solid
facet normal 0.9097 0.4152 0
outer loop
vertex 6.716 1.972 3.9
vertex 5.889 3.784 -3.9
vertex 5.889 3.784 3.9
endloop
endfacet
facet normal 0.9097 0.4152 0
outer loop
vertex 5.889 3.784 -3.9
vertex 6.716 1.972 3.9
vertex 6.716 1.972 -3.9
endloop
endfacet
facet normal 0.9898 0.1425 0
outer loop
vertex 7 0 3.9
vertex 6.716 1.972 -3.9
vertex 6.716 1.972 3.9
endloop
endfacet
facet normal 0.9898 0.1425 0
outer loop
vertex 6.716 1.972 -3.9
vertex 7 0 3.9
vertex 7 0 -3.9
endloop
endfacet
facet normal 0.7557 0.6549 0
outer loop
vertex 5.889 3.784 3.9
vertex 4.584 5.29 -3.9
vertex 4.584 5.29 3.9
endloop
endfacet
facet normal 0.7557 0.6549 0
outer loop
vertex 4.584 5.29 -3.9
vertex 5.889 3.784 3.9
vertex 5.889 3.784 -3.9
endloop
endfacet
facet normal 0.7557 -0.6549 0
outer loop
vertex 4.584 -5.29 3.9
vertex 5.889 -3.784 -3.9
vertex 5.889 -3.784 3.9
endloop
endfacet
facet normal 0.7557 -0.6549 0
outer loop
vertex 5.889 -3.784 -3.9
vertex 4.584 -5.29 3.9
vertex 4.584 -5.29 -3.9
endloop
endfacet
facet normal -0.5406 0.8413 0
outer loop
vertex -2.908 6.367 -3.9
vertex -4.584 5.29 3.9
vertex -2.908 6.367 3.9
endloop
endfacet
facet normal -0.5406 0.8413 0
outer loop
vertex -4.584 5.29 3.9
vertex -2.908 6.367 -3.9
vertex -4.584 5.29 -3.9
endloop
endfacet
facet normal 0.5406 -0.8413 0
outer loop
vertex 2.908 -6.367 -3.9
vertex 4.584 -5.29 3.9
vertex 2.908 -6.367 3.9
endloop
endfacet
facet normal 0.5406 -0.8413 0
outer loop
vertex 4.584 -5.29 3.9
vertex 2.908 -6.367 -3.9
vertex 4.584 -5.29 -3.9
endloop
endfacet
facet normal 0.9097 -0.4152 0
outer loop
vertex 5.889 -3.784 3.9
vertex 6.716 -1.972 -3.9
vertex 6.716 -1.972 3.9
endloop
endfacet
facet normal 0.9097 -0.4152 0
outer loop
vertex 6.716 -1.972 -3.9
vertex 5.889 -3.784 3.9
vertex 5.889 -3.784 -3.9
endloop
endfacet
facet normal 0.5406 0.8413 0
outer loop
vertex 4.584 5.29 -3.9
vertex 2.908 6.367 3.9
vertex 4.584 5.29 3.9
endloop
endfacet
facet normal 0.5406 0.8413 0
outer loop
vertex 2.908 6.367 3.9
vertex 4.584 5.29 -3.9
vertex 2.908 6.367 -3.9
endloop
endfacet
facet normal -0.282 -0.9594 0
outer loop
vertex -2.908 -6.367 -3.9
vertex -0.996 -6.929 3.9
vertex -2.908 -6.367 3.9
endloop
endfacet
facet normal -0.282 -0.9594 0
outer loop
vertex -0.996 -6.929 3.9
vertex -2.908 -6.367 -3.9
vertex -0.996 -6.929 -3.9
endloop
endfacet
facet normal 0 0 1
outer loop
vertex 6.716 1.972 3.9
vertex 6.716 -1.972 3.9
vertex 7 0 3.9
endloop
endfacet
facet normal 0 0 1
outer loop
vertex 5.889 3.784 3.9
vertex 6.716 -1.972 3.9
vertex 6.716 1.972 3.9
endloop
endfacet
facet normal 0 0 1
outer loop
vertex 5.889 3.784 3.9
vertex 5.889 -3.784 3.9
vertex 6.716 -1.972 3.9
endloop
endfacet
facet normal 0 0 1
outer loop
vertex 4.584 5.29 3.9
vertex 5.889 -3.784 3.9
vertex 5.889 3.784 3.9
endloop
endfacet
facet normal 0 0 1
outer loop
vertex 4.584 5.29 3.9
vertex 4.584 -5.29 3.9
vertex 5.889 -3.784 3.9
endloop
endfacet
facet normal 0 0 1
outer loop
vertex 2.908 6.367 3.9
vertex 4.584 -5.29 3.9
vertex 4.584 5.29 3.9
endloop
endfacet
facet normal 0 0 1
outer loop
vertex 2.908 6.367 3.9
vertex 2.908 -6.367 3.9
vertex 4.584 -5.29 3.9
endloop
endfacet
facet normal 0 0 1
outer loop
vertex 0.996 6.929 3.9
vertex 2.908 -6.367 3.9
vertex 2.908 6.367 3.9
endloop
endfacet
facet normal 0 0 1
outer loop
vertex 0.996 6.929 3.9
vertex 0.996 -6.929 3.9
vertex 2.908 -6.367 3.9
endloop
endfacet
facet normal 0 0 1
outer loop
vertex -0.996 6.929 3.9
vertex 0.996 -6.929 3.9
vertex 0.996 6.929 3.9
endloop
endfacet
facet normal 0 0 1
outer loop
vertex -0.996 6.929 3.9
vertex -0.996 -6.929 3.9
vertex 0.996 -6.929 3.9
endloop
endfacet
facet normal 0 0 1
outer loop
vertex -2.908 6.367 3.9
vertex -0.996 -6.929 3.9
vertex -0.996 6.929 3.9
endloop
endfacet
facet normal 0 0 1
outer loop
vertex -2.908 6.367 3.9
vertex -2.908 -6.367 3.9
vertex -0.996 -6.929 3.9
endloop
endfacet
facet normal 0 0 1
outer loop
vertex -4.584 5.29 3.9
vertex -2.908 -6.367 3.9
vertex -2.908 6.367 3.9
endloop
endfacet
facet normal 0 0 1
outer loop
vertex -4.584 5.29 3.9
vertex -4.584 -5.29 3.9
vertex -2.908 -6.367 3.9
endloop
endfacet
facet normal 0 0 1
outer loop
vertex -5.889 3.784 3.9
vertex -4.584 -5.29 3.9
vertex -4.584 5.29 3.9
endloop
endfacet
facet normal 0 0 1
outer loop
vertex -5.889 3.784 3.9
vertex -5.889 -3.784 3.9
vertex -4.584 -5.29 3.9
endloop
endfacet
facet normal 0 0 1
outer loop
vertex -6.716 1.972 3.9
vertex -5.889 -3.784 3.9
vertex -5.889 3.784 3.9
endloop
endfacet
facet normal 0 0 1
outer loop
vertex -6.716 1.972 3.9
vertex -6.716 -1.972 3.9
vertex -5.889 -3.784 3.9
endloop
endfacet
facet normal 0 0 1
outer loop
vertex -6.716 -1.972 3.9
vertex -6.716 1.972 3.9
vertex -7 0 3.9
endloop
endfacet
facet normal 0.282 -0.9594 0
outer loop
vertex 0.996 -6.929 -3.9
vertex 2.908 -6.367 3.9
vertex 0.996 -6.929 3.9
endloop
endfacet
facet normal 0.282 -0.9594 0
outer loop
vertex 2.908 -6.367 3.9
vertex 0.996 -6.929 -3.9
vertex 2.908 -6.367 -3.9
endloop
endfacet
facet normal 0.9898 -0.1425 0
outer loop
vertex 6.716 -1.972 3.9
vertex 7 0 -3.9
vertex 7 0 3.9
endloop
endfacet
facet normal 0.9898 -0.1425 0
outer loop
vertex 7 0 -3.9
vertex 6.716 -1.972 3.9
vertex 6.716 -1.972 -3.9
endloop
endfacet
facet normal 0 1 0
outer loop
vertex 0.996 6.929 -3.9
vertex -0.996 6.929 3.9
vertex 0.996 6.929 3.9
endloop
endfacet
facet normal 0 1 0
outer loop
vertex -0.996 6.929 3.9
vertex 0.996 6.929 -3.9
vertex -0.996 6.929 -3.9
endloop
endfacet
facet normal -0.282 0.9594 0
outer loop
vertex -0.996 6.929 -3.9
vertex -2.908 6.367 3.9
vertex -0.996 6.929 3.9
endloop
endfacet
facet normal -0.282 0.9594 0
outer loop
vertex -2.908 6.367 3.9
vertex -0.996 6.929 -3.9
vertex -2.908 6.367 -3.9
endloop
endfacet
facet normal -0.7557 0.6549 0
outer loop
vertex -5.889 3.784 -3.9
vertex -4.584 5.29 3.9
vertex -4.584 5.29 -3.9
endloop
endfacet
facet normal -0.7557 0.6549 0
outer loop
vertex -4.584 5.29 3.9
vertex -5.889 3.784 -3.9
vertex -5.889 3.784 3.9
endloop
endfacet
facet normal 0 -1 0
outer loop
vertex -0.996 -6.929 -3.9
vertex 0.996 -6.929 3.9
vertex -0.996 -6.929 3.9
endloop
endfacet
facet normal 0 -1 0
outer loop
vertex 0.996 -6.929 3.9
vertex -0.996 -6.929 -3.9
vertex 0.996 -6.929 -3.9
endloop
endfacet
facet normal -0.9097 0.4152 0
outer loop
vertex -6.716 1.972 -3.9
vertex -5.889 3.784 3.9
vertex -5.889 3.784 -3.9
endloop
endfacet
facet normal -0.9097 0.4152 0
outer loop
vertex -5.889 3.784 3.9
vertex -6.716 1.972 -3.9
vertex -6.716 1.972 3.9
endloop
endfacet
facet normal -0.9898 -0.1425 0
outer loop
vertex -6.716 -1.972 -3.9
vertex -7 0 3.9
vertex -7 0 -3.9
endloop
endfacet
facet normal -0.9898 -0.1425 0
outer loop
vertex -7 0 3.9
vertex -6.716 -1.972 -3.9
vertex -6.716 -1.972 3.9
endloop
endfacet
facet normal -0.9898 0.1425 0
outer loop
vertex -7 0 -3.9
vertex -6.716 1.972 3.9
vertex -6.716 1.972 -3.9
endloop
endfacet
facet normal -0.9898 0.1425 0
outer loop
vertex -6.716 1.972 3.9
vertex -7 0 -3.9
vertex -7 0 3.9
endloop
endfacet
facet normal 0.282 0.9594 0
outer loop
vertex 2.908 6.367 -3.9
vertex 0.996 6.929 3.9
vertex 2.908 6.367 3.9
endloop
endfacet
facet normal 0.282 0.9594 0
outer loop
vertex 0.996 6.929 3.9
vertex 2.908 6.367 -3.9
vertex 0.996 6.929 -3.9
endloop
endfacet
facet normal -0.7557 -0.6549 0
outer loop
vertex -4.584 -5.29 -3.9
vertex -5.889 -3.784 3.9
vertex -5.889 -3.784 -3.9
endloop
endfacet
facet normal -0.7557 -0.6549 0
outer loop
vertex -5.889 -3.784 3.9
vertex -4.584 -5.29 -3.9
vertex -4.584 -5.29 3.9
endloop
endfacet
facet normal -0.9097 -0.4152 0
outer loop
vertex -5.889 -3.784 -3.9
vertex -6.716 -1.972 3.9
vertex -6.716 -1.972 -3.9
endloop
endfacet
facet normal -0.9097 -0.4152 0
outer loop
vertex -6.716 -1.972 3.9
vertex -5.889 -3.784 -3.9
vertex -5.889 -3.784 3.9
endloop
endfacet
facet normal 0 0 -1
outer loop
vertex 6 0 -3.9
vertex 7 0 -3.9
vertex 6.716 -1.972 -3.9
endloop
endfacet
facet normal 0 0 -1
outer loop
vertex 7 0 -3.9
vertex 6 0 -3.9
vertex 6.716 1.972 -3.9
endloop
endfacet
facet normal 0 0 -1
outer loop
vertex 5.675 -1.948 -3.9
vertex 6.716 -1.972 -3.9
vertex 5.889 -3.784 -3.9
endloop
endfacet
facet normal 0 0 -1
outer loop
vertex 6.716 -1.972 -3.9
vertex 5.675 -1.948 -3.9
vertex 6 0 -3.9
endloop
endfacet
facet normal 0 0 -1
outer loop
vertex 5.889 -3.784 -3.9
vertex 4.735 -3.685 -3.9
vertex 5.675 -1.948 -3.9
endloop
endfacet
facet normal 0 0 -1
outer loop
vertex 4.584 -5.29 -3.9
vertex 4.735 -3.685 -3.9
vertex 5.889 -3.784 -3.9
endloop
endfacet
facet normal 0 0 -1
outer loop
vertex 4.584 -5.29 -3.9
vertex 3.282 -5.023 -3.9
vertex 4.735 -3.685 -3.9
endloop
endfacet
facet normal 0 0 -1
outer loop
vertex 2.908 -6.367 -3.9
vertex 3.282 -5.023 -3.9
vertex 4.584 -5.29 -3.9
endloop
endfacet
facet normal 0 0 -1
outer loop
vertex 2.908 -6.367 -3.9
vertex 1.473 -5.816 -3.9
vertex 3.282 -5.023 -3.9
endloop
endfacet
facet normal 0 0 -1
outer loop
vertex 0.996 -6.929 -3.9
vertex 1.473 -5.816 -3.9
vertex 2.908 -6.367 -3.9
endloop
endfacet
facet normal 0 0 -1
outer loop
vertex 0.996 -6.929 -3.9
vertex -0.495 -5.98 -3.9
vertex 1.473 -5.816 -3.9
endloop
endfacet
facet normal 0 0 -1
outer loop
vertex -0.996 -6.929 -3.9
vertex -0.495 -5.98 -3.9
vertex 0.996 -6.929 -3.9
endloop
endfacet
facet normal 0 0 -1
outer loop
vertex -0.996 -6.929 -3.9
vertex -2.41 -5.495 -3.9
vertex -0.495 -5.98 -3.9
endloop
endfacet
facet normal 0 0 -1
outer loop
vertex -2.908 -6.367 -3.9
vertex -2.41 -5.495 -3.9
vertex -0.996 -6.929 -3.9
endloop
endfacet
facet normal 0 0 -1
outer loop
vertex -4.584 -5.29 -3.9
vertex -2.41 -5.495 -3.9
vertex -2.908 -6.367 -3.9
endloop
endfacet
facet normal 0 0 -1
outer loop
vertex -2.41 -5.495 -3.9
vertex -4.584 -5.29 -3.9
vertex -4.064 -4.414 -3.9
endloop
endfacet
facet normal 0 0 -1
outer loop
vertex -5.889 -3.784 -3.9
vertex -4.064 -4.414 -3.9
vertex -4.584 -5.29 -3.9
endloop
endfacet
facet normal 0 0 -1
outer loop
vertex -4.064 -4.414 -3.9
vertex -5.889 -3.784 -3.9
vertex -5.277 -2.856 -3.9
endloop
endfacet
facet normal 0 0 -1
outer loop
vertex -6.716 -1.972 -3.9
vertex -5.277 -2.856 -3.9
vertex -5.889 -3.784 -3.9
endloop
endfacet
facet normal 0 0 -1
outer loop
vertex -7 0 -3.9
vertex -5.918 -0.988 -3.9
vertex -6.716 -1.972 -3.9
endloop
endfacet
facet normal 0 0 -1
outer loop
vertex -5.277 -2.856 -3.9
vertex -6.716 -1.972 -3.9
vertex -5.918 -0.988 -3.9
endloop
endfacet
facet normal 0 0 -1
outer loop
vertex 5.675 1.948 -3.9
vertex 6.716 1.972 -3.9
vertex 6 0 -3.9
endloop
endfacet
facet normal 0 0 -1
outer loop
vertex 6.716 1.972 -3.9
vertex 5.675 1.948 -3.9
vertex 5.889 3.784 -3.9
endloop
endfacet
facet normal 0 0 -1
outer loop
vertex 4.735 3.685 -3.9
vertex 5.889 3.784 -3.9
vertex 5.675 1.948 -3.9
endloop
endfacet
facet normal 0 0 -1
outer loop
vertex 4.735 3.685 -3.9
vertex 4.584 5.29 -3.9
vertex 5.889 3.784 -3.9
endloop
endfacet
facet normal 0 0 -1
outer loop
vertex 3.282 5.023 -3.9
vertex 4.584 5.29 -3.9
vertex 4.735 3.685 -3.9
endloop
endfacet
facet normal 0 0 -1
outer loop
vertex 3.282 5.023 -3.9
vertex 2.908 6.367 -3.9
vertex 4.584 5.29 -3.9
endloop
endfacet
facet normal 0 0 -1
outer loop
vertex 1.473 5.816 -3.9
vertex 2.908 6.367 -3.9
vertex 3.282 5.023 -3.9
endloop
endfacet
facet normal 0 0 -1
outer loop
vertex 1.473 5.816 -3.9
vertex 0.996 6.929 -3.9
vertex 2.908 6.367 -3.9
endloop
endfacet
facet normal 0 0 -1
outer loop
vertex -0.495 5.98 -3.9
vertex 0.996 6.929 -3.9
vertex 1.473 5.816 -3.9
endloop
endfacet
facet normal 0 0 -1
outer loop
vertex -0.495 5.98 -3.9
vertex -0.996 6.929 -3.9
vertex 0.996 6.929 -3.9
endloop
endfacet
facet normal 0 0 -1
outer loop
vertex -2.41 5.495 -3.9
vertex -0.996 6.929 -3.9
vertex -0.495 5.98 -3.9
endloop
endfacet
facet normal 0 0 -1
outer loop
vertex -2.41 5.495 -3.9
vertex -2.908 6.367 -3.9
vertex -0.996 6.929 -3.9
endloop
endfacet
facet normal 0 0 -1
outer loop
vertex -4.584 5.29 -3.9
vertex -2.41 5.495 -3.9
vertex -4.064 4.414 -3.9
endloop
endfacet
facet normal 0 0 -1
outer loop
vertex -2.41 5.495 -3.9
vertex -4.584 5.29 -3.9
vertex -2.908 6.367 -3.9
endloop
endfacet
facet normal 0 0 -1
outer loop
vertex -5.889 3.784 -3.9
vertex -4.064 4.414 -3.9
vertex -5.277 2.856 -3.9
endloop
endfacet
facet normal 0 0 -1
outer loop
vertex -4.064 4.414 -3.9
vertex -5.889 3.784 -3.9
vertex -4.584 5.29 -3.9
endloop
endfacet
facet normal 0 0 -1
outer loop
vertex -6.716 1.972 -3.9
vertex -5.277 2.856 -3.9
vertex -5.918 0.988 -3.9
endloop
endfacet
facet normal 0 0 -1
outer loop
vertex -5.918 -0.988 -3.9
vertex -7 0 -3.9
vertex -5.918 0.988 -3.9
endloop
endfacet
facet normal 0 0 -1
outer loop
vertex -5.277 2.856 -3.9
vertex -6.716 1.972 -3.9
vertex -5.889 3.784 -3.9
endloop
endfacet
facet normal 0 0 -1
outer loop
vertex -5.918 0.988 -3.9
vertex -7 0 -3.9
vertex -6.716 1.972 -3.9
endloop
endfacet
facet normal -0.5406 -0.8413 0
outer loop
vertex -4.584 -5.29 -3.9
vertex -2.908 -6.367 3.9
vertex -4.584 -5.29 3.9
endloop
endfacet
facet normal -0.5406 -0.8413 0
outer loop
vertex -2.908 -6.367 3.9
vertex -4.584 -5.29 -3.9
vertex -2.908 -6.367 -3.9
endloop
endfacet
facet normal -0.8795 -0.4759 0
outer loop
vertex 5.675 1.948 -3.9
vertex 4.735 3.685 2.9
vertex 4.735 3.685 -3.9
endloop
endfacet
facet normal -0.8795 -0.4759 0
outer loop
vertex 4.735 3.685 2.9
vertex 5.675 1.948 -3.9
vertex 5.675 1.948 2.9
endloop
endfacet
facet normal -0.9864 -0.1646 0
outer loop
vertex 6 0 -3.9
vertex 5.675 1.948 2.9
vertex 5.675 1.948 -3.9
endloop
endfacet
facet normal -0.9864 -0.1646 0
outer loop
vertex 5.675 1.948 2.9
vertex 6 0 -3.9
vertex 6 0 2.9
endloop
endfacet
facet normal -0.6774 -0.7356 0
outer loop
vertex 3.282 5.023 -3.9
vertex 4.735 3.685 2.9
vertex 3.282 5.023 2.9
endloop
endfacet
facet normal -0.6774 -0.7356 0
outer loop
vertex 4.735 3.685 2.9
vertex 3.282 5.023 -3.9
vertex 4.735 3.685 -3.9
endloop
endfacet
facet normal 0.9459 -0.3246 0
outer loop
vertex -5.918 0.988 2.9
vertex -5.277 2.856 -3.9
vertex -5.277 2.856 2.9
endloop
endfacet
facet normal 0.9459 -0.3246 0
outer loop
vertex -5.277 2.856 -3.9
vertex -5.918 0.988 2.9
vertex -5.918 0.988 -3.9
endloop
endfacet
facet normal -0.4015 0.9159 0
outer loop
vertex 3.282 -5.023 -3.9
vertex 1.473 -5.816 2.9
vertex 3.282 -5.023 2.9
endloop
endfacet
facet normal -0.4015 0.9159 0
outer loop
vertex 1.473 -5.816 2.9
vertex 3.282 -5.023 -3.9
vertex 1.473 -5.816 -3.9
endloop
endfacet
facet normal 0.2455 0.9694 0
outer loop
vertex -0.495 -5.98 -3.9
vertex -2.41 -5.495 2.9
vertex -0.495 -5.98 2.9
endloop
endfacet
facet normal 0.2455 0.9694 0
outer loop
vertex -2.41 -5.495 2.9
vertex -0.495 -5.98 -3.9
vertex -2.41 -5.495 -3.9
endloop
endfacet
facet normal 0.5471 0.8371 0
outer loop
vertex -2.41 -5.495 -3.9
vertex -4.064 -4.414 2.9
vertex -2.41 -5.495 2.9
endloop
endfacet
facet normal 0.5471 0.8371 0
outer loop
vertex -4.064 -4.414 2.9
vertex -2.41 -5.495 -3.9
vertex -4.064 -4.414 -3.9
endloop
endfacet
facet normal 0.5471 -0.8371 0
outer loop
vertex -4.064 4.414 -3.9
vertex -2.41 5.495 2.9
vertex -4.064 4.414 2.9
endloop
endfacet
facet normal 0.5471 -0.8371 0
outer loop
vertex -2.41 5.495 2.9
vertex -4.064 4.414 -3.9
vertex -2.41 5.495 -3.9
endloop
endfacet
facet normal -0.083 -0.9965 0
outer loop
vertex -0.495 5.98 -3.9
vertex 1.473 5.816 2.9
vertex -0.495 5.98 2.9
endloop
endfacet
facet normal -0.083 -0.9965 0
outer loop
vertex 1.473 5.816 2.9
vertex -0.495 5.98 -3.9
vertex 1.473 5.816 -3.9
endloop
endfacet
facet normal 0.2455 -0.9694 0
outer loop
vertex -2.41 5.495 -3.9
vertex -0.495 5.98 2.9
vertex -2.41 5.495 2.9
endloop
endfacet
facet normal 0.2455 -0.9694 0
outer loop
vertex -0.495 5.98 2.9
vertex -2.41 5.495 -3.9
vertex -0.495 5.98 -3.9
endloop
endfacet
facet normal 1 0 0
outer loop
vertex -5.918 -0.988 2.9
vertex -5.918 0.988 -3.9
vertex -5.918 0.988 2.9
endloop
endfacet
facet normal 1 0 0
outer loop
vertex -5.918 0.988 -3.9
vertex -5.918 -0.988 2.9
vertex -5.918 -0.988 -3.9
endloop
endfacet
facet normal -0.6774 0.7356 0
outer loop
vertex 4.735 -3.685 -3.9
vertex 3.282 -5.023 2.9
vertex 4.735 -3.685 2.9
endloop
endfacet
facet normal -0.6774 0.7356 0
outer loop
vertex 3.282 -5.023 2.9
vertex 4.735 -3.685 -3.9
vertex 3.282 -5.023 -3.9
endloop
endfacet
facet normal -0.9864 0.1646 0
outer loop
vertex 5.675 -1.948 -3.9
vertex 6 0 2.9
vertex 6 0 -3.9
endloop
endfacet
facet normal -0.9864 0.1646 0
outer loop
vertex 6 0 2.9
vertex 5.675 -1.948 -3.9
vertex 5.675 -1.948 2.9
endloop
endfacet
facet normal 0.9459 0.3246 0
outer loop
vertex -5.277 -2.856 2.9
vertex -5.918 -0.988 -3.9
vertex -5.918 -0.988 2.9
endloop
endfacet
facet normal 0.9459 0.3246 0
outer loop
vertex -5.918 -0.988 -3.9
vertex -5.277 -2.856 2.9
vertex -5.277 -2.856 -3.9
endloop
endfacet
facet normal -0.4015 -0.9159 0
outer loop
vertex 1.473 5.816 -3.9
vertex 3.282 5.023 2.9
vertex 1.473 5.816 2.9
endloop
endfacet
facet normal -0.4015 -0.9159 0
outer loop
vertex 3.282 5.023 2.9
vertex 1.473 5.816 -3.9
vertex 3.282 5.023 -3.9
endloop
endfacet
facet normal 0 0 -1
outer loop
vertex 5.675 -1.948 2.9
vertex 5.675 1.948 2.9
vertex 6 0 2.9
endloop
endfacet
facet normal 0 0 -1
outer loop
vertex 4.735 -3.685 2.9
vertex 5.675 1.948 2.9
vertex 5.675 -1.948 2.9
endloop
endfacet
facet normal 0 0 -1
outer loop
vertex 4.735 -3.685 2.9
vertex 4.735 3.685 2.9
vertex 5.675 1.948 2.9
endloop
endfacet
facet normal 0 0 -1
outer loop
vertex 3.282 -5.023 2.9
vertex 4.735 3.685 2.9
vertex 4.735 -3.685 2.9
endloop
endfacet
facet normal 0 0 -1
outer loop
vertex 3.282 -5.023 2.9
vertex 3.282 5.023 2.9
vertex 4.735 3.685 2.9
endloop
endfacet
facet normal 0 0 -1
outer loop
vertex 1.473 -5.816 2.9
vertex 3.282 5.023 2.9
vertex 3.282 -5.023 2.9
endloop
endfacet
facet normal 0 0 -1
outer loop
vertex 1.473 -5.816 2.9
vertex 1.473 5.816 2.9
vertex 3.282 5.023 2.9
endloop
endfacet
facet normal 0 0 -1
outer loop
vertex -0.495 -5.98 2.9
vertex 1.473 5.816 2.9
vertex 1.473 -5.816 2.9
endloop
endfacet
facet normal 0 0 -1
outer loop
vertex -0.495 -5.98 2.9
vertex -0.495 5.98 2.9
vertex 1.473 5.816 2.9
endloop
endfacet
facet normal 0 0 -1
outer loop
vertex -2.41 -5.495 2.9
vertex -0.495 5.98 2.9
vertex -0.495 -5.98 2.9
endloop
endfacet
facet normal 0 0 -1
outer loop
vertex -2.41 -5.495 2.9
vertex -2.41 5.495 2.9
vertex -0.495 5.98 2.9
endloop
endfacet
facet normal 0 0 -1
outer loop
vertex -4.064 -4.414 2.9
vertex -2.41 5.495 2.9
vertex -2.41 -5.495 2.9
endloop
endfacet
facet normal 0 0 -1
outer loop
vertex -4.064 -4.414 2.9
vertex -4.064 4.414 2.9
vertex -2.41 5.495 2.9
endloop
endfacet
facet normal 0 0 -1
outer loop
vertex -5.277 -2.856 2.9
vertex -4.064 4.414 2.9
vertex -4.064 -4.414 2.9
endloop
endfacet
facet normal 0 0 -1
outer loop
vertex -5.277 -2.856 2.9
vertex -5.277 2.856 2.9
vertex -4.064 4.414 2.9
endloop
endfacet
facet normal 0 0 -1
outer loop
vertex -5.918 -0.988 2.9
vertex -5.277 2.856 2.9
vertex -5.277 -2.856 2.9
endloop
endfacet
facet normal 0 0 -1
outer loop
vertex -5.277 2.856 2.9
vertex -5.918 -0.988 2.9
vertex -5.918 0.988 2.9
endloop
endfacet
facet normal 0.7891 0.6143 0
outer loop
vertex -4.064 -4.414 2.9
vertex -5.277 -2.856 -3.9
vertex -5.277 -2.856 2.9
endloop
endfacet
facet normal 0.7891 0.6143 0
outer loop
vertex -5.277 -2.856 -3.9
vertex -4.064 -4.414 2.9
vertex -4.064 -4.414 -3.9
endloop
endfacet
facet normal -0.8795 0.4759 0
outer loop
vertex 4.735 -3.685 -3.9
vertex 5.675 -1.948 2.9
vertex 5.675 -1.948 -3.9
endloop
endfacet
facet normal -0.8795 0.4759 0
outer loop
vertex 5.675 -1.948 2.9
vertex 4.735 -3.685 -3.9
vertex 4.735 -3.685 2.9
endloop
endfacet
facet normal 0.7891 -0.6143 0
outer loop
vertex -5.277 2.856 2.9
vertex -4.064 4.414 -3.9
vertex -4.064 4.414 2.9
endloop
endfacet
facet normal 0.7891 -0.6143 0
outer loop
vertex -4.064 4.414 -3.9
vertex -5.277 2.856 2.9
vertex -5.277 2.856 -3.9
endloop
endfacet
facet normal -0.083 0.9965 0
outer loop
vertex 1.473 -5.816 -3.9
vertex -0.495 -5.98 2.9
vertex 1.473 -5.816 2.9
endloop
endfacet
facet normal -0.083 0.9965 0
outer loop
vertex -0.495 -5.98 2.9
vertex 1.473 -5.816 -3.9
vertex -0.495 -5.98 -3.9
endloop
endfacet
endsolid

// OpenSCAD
total_diameter = 14.0;
total_width = 7.8;
wall_thickness = 1.0;
dog_width = 0.8;
dog_intrusion = 0.7;

/* [Hidden] */
axle_hole_diameter = 5.0;


clutch();


module clutch()
{
    hollow_cylinder();

    module hollow_cylinder()
    {
        interior_diameter = total_diameter - (2 * wall_thickness); 

        difference()
        {
            cylinder(h = total_width, r = total_diameter / 2, center = true);
            translate(v = [0, 0, -wall_thickness / 2]) 
            cylinder(h = total_width - wall_thickness, r = interior_diameter / 2, center = true);
        }
    }
}
